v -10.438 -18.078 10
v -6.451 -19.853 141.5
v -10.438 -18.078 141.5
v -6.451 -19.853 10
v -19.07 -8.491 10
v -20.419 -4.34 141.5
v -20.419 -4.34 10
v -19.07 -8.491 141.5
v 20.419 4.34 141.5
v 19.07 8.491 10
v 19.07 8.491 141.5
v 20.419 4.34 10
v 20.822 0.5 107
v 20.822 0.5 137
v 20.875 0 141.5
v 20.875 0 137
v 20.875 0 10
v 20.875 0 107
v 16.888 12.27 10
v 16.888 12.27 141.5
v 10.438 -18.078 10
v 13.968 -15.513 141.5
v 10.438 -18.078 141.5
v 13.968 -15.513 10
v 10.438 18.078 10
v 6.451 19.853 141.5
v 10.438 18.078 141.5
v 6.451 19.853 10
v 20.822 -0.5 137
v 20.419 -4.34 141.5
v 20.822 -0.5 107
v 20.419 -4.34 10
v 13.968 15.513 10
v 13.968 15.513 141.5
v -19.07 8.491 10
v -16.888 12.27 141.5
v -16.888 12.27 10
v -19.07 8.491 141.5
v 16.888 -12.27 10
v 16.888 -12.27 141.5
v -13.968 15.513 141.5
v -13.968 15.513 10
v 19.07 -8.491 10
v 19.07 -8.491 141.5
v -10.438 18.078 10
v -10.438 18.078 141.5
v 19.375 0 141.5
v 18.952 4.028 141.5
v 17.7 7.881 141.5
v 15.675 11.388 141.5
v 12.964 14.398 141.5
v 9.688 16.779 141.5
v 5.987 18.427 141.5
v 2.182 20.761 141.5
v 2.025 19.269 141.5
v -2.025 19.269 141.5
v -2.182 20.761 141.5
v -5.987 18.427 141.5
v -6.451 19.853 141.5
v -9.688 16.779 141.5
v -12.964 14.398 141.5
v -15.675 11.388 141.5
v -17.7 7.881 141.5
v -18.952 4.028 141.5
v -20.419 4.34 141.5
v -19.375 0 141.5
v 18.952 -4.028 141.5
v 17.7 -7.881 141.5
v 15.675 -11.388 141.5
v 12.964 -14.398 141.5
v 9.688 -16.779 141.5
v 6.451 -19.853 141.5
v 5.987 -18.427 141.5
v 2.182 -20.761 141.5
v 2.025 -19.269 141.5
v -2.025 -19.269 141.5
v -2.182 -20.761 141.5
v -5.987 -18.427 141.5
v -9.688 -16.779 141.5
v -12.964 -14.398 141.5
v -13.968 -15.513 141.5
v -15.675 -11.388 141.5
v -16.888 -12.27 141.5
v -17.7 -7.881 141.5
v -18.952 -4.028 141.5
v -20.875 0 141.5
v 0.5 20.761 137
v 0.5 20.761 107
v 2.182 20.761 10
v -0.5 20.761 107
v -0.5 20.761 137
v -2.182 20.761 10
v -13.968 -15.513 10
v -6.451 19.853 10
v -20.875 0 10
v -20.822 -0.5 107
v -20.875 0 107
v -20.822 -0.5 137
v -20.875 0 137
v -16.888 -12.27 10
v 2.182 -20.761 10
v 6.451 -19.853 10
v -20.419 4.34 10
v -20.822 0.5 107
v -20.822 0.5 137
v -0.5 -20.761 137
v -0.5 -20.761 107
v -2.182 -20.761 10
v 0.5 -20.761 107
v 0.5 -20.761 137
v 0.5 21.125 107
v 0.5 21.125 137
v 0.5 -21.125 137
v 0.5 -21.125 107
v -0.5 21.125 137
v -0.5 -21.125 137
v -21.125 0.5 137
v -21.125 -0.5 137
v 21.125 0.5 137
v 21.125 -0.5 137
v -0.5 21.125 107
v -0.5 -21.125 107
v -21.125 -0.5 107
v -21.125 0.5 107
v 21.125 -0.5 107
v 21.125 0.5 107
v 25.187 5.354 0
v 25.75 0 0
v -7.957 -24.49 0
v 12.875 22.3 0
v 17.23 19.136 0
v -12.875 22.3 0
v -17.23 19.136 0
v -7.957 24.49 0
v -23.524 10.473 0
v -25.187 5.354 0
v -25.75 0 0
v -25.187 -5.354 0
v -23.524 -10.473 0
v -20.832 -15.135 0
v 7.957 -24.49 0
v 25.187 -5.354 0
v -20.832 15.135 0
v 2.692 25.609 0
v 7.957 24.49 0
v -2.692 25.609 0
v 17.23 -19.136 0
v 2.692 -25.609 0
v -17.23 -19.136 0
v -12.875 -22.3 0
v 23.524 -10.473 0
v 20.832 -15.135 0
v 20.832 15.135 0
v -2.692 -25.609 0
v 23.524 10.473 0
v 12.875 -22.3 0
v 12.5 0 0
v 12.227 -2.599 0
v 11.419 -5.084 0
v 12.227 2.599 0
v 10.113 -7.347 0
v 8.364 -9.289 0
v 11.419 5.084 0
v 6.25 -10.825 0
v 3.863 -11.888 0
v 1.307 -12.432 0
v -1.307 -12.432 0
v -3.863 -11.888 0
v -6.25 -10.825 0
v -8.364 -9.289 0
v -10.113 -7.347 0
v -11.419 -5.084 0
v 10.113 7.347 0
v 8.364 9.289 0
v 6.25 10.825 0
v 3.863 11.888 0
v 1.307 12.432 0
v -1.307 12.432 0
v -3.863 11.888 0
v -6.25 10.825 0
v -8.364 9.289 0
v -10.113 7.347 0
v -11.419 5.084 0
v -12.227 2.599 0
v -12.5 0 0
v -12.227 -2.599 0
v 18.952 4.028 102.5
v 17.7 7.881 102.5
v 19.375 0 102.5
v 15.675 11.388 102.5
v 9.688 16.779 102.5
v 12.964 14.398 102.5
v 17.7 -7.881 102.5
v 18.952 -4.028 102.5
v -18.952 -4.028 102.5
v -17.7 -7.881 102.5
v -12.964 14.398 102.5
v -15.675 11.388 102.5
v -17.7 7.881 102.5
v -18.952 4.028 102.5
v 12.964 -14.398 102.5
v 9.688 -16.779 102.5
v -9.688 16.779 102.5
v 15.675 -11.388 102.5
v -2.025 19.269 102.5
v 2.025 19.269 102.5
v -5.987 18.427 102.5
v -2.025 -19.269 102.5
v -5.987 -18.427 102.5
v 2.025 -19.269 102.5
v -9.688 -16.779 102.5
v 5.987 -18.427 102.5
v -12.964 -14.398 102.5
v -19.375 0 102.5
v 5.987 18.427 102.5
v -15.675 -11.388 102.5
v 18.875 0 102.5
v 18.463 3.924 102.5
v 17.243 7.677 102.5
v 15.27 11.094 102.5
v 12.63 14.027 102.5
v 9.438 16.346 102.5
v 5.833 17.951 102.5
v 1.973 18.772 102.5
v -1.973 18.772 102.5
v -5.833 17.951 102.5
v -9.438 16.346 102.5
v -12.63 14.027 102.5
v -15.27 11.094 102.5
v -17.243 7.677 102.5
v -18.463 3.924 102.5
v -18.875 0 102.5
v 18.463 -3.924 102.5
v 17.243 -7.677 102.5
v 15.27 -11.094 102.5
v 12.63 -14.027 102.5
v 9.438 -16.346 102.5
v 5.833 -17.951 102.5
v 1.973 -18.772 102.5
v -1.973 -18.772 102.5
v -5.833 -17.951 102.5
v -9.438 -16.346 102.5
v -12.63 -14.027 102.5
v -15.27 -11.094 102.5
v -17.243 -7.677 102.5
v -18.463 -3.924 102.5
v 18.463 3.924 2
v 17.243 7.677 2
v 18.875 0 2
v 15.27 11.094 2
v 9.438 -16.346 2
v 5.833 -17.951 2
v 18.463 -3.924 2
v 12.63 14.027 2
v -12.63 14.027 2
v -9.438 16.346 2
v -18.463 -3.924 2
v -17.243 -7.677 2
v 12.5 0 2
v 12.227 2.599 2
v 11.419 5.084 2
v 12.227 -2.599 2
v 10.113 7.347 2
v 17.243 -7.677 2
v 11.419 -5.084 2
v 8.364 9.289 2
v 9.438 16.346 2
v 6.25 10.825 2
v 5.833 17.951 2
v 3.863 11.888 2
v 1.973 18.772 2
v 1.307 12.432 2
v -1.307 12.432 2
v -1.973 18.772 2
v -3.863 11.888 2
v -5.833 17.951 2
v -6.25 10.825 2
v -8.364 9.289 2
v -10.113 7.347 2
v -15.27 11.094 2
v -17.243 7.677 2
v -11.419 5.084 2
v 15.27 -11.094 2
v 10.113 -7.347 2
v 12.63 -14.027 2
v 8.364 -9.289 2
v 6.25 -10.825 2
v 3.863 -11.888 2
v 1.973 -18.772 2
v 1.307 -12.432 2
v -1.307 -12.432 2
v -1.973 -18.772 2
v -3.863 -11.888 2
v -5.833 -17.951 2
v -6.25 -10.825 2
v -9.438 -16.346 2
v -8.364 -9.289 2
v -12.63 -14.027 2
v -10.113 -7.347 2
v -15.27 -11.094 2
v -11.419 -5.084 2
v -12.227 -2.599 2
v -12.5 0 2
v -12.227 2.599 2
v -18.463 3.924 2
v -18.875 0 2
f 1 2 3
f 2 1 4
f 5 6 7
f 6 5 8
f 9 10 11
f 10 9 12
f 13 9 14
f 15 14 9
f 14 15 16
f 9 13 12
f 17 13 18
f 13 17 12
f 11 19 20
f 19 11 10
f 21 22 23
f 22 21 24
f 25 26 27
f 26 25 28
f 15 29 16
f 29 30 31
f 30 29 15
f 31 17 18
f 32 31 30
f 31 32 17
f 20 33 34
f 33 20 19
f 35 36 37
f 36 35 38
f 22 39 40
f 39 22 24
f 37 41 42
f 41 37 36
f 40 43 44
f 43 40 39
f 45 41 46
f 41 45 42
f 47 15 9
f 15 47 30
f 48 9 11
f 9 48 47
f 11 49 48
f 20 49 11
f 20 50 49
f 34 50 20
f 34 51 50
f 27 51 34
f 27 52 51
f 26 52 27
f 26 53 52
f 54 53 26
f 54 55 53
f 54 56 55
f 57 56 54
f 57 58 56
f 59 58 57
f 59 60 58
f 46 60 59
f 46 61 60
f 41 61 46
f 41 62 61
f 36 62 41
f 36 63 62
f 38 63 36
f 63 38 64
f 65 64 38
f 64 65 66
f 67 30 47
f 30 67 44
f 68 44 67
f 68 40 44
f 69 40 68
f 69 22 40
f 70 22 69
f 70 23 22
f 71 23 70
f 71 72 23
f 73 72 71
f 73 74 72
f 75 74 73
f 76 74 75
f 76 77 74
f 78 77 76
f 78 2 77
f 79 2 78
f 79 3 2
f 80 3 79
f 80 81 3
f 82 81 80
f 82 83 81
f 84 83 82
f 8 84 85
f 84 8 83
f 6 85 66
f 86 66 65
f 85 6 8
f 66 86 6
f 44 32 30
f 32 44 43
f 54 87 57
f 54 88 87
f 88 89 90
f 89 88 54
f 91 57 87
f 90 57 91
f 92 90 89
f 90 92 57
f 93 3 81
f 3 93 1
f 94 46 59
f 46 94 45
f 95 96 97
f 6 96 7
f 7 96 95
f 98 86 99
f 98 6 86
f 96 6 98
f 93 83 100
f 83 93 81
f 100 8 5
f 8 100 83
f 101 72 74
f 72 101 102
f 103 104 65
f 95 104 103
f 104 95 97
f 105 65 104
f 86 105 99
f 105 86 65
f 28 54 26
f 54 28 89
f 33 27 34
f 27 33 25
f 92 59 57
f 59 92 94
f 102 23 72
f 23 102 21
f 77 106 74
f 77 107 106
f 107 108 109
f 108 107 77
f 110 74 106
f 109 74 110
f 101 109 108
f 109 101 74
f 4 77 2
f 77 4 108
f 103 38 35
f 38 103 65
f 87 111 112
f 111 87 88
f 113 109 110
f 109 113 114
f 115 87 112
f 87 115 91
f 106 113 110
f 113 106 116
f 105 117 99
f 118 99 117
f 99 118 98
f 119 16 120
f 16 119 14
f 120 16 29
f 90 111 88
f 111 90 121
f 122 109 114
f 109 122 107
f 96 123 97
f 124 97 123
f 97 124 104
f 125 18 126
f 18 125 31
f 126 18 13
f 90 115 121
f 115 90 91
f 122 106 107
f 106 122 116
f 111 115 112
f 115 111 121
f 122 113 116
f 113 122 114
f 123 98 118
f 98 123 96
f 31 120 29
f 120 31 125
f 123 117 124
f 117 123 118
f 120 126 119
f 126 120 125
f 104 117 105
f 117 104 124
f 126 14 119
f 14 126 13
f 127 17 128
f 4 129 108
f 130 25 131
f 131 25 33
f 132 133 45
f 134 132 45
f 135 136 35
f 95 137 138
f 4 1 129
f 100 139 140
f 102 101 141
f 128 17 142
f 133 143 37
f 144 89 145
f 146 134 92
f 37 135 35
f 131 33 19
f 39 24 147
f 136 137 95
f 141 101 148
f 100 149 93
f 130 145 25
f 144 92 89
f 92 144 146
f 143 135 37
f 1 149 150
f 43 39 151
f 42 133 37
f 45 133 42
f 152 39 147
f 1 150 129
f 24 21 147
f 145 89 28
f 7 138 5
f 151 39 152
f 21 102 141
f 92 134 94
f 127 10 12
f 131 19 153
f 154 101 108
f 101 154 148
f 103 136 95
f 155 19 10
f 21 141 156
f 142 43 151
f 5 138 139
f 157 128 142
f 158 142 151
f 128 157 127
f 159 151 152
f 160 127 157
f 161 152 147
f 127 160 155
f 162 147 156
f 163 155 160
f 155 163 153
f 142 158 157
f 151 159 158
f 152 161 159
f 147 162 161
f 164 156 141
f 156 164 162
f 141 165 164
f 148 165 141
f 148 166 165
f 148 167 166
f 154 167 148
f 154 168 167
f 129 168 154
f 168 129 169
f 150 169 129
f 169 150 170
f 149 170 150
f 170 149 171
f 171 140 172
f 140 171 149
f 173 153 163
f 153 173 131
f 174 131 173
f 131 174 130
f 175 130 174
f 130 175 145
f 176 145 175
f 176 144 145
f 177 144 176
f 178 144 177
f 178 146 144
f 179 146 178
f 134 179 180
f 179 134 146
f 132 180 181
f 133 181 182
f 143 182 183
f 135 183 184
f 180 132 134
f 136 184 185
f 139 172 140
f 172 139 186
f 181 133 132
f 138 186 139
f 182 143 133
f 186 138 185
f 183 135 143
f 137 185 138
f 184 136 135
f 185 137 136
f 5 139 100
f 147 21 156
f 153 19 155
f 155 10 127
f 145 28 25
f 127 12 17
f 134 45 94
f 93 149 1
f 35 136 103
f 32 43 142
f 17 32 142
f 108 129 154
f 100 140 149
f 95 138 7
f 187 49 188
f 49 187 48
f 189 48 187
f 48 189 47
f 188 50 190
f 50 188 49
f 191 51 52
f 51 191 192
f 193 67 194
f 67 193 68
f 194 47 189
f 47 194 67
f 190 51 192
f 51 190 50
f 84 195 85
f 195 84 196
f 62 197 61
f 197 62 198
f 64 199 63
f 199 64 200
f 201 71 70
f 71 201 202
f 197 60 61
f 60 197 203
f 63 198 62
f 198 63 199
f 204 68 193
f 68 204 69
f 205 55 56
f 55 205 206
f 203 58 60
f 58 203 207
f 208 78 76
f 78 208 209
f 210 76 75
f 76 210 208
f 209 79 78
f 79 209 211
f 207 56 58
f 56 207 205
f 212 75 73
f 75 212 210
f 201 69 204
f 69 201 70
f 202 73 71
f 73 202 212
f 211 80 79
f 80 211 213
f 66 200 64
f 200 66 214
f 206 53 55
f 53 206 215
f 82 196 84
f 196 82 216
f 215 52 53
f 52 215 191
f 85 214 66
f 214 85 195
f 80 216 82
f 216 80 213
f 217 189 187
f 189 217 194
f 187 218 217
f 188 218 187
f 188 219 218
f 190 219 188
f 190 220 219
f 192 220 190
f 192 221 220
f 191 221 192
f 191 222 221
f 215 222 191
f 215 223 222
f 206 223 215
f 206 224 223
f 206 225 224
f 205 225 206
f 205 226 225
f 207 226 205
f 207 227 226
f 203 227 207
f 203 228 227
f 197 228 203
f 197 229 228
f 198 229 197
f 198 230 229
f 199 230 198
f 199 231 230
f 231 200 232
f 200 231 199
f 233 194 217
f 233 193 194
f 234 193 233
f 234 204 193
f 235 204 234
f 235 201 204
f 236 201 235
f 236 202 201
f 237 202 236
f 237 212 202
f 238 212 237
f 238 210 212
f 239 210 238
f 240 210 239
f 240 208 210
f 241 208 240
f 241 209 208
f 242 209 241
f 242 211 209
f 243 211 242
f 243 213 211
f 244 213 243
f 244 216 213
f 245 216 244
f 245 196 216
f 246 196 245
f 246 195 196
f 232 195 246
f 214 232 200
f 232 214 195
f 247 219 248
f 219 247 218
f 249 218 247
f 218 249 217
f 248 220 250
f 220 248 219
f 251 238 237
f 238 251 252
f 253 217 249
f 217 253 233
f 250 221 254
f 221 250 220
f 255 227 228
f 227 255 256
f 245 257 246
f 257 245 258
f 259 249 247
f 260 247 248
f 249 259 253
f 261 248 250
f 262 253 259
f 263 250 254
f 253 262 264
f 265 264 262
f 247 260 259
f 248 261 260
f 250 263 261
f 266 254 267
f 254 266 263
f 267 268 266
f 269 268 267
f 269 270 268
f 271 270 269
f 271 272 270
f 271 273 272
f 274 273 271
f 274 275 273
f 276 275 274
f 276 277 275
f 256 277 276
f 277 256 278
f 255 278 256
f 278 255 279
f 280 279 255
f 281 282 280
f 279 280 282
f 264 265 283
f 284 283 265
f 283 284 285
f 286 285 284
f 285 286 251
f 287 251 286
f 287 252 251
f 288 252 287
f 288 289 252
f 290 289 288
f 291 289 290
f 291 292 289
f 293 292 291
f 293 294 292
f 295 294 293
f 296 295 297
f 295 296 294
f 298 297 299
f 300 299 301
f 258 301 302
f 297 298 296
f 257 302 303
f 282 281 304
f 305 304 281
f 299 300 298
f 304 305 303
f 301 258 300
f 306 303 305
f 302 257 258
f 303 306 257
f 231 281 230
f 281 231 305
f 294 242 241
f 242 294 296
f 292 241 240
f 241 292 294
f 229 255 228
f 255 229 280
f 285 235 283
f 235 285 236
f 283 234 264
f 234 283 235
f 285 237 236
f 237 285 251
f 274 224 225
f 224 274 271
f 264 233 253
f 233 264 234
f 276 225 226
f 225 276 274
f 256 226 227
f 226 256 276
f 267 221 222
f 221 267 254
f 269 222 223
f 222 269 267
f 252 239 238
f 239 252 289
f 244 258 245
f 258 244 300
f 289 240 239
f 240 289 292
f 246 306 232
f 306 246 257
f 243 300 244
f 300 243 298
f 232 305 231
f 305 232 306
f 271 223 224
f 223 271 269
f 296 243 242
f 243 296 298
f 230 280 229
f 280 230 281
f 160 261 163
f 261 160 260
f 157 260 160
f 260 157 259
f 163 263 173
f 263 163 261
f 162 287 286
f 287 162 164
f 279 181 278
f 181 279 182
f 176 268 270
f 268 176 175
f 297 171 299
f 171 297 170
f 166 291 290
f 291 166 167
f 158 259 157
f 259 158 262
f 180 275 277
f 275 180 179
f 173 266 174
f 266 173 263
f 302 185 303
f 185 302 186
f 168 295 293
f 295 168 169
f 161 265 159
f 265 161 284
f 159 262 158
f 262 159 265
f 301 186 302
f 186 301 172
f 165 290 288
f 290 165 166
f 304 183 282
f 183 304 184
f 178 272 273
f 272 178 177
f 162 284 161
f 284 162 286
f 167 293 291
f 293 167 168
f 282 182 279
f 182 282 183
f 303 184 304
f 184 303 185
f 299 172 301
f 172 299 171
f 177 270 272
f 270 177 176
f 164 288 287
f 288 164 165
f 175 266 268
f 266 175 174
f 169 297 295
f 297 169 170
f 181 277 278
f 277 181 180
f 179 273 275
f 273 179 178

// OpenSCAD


/* [Tube Foot] */

// original 66.5, new 141.5
total_height_text_box = 141.5;

// Thickness of the main tube body
shell_width = 2;

// Tube thickness to accept the tube above it, the rest of the tube can be thicker
top_shell_width = 1.5;

// Diameter of the outside of the tube
outer_diameter_textbox = 41.75;

// Foot diameter, make it bigger to spread the weight.
foot_diameter_text_box = 51.5;

// Hight of the foot relief 
foot_relief_height_text_box = 10;

// Hole diameter at bottom of foot
foot_hole_diameter_text_box = 25;

// Vertical line length
friction_line_height_text_box = 30;

// Width of vertical friction line
friction_line_width_text_box = 1;

// Depth of vertical friction line, increase for more friction
friction_line_depth_text_box = 0.25;

// offset of vertical friction line
friction_line_top_offset_text_box = 4.5;

main_height_text_box = total_height_text_box - foot_relief_height_text_box;

top_innertube_height = friction_line_height_text_box + 2*friction_line_top_offset_text_box;


module build_tube(){
    difference(){
        union(){
        
            // Full tube
            translate([0, 0, foot_relief_height_text_box]) cylinder(main_height_text_box, r=outer_diameter_textbox/2, center=false);

            // Fiction line
            translate([0, 0, foot_relief_height_text_box + main_height_text_box - friction_line_top_offset_text_box - friction_line_height_text_box/2]) cube([friction_line_width_text_box, outer_diameter_textbox + 2*friction_line_depth_text_box, friction_line_height_text_box], center=true);
            
            // Fiction line
            rotate([0,0,90]) translate([0, 0, foot_relief_height_text_box + main_height_text_box - friction_line_top_offset_text_box - friction_line_height_text_box/2]) cube([friction_line_width_text_box, outer_diameter_textbox + 2*friction_line_depth_text_box, friction_line_height_text_box], center=true);
            
            // Main foot
            cylinder(foot_relief_height_text_box, r1=foot_diameter_text_box/2, r2=outer_diameter_textbox/2, center=false);
            
        }
            
        
        // Make top part of tube correct shell width to fit with original parts
        translate([0, 0, foot_relief_height_text_box + main_height_text_box - top_innertube_height]) cylinder(top_innertube_height, r=(outer_diameter_textbox - 2*top_shell_width)/2, center=false);
            
        // Hollow part of tube
        translate([0, 0, shell_width]) cylinder(main_height_text_box + foot_relief_height_text_box, r= (outer_diameter_textbox - 2*shell_width)/2, center=false);
        
        // Bottom foot hole
        cylinder(foot_relief_height_text_box * 3, r=foot_hole_diameter_text_box/2, center=true);

    }
}

build_tube();
    
    
